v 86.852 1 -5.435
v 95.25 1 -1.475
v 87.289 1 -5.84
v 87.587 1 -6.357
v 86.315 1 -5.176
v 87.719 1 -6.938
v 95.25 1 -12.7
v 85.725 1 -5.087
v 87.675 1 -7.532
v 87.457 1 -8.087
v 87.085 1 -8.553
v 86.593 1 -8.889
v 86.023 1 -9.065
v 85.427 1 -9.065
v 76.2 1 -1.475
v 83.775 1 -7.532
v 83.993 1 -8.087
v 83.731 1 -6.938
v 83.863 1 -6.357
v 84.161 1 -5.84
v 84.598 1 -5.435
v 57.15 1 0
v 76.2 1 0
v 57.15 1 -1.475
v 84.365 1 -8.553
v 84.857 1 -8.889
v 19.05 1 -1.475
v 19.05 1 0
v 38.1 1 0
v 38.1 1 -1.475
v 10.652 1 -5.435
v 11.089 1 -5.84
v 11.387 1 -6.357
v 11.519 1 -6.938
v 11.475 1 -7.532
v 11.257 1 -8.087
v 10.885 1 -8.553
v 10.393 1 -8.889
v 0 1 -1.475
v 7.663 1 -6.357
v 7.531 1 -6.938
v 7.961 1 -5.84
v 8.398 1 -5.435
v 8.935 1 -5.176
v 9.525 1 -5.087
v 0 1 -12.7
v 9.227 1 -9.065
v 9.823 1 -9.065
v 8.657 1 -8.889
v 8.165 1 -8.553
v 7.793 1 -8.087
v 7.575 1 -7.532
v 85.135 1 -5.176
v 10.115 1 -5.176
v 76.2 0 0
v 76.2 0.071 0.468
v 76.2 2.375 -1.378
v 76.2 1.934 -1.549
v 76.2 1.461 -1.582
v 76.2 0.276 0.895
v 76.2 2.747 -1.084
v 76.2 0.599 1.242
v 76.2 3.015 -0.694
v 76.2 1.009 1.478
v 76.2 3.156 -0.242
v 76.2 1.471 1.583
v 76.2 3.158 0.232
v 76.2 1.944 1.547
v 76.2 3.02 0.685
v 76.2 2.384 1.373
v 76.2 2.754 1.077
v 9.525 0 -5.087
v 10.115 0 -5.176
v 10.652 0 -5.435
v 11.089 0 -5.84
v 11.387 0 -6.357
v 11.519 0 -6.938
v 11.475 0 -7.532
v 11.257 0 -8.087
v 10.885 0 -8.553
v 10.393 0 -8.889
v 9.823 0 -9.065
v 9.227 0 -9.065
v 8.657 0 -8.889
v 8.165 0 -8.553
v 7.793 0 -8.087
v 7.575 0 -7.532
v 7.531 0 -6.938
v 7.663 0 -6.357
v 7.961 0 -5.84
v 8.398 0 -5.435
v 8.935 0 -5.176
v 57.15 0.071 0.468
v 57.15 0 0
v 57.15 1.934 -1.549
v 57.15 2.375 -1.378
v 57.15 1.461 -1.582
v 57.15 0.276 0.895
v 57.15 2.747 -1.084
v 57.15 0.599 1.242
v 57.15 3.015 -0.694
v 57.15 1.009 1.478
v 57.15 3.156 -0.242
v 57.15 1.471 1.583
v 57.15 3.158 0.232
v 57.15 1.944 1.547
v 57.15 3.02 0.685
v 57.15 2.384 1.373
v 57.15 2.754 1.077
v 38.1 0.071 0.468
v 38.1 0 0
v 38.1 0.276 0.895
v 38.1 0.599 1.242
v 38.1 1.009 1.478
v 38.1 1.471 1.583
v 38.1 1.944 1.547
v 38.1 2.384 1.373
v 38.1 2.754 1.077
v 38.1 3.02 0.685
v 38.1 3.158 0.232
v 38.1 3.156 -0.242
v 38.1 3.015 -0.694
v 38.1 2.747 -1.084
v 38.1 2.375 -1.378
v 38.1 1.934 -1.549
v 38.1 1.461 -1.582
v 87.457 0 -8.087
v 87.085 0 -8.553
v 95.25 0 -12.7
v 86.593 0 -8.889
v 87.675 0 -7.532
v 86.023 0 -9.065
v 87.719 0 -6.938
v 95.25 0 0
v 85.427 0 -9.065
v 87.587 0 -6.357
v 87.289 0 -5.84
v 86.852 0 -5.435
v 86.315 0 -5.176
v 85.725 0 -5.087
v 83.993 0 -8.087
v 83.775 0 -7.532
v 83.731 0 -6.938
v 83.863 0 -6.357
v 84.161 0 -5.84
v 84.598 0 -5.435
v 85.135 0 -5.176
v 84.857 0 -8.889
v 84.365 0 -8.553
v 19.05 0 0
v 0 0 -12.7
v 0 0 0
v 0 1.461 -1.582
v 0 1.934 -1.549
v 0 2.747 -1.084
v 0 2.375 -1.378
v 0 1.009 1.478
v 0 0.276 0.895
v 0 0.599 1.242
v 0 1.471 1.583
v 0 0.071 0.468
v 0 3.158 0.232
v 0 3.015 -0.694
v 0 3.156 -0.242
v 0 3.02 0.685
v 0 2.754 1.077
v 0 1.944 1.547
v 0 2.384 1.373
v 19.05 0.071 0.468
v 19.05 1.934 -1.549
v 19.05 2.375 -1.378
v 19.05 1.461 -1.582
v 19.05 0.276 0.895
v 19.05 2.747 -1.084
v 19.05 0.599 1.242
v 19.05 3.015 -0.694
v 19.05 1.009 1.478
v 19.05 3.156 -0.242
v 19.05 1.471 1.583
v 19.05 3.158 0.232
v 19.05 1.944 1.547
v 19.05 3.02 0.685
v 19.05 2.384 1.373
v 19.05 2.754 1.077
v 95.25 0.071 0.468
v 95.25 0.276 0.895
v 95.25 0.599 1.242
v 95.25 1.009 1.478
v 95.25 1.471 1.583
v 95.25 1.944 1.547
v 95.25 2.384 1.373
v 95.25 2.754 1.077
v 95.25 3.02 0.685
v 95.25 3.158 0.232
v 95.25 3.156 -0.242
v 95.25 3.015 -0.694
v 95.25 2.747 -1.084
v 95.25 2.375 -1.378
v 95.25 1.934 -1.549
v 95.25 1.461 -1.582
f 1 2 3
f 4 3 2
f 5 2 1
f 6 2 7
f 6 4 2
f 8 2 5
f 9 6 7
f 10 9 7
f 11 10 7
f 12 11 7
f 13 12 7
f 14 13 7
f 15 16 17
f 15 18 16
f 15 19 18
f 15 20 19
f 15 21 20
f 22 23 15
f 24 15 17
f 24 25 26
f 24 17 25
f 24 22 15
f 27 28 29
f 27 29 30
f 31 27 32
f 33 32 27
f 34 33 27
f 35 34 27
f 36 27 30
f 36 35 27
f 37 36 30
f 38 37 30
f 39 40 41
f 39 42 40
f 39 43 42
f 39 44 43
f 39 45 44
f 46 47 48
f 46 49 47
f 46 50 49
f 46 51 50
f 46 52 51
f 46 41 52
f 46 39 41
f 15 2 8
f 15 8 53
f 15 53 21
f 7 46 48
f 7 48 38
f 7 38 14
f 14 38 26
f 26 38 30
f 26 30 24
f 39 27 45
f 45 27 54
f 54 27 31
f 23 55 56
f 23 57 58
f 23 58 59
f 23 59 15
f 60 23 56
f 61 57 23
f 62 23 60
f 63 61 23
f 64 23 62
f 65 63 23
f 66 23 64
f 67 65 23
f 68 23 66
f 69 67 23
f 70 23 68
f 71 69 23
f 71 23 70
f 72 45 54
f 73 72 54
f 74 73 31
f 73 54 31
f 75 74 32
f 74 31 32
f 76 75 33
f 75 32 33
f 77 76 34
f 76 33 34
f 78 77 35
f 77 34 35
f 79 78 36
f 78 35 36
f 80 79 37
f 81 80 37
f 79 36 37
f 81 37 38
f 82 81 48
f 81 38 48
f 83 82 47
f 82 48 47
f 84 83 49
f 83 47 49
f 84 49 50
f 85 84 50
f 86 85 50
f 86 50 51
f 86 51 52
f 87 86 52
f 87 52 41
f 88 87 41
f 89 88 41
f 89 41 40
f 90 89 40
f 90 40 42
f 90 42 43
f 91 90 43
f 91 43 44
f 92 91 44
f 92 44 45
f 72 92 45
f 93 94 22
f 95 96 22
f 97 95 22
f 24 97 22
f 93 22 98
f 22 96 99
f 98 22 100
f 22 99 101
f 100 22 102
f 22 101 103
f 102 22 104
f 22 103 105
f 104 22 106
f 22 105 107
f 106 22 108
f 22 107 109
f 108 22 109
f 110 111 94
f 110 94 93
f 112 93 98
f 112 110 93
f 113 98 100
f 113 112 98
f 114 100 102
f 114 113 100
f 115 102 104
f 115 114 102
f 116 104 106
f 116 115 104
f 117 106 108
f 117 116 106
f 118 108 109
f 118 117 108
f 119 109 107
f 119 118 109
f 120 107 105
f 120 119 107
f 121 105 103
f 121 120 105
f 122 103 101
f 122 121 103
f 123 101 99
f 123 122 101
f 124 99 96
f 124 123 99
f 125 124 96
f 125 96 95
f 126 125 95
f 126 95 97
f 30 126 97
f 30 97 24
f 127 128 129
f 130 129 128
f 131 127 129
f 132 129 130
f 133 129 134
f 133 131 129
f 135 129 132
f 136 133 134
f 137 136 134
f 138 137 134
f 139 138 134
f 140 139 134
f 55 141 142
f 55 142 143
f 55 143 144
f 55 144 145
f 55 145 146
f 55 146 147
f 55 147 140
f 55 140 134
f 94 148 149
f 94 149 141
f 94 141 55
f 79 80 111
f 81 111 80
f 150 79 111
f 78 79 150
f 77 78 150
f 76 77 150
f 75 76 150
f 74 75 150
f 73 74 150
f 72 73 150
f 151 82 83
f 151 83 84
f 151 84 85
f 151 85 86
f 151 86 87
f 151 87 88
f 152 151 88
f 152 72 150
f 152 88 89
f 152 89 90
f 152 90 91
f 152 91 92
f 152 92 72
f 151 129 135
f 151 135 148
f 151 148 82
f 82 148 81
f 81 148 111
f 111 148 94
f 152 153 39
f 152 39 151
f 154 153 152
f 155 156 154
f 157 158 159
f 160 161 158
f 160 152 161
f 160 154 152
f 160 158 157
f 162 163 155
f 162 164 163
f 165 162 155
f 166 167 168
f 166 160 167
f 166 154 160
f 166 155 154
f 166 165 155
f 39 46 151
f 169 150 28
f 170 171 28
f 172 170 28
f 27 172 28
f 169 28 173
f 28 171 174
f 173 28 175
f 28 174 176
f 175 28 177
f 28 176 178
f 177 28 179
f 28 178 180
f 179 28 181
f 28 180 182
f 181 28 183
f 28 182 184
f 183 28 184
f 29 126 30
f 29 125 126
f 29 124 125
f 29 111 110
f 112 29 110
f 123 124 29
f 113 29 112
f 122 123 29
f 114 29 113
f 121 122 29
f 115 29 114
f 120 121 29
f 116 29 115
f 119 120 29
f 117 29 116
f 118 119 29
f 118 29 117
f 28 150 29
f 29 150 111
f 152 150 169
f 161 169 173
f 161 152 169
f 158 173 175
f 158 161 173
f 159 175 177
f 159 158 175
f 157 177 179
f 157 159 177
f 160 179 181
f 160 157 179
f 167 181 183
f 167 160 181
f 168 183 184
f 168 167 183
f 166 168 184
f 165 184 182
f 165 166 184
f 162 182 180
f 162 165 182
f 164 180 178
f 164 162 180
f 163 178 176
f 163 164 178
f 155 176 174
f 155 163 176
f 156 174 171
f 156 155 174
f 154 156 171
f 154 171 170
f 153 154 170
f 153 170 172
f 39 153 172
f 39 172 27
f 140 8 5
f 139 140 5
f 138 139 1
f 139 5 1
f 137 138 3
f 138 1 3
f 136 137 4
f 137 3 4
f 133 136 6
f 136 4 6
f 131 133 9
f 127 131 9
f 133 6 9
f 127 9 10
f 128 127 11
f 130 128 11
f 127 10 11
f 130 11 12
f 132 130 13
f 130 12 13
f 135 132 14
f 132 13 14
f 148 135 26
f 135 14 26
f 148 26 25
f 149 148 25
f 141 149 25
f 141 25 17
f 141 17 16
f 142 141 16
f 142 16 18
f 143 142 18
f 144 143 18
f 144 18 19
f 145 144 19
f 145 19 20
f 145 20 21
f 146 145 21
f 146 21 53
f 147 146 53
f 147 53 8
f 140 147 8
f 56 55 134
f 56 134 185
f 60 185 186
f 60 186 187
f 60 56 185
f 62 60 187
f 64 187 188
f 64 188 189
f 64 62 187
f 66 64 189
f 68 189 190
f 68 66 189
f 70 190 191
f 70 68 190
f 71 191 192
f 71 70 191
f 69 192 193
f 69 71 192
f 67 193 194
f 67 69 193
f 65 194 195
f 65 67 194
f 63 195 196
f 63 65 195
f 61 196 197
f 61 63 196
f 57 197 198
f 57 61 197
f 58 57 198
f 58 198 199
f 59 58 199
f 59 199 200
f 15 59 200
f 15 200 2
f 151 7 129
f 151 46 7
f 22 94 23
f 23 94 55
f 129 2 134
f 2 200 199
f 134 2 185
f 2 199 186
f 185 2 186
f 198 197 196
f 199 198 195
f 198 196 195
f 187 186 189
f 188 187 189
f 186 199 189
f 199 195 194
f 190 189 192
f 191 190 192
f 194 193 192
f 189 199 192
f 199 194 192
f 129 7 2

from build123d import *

# Parameters (mm, degrees)
SKETCH1_W               = 38.1
SKETCH1_H               = 12.7
BOSS_EXTRUDE1_DEPTH     = 1
SKETCH2_R               = 1.5875
BOSS_EXTRUDE2_DEPTH     = 19.05
MATRIZL1_COUNT          = 2
MATRIZL1_PITCH          = 38.1
SALIENTE_EXTRUIR1_DEPTH = 19.05
CROQUIS2_R              = 2
CORTAR_EXTRUIR1_DEPTH   = 19.05


with BuildPart() as part:
    # Sketch1 → Boss-Extrude1 (new body)
    with BuildSketch(Plane(origin=(0, 0, 0), x_dir=(1, 0, 0), z_dir=(0, 1, 0))):
        with Locations((19.05, 6.35)):
            Rectangle(SKETCH1_W, SKETCH1_H)
    boss_extrude1 = extrude(amount=BOSS_EXTRUDE1_DEPTH)

    # Sketch2 → Boss-Extrude2 (add)
    with BuildSketch(Plane.ZY):
        with Locations((0, 1.5875)):
            Circle(SKETCH2_R)
    boss_extrude2 = extrude(amount=-BOSS_EXTRUDE2_DEPTH)

    # MatrizL1: Boss-Extrude1, Boss-Extrude2 ×2
    with Locations(*[(i * MATRIZL1_PITCH, 0, 0) for i in range(1, MATRIZL1_COUNT)]):
        add(boss_extrude1)
        add(boss_extrude2)

    # Croquis1 → Saliente-Extruir1 (add)
    with BuildSketch(Plane(origin=(76.2, 0, 0), x_dir=(0, 0, -1), z_dir=(1, 0, 0))):
        with BuildLine():
            Line((12.7, 0), (0, 0))
            ThreePointArc((0, 0), (-0.890926484, 2.901427795), (1.47478812, 1))
            Line((1.47478812, 1), (12.7, 1))
            Line((12.7, 1), (12.7, 0))
        make_face()
    extrude(amount=SALIENTE_EXTRUIR1_DEPTH)

    # Croquis2 → Cortar-Extruir1 (cut)
    with BuildSketch(Plane(origin=(0, 1, 0), x_dir=(1, 0, 0), z_dir=(0, 1, 0))):
        with Locations(Location((85.725, 7.08739406, 0), (0, 0, 270))):
            Circle(CROQUIS2_R)
        with Locations(Location((9.525, 7.08739406, 0), (0, 0, 270))):
            Circle(CROQUIS2_R)
    extrude(amount=-CORTAR_EXTRUIR1_DEPTH, mode=Mode.SUBTRACT)


solid = part.part
